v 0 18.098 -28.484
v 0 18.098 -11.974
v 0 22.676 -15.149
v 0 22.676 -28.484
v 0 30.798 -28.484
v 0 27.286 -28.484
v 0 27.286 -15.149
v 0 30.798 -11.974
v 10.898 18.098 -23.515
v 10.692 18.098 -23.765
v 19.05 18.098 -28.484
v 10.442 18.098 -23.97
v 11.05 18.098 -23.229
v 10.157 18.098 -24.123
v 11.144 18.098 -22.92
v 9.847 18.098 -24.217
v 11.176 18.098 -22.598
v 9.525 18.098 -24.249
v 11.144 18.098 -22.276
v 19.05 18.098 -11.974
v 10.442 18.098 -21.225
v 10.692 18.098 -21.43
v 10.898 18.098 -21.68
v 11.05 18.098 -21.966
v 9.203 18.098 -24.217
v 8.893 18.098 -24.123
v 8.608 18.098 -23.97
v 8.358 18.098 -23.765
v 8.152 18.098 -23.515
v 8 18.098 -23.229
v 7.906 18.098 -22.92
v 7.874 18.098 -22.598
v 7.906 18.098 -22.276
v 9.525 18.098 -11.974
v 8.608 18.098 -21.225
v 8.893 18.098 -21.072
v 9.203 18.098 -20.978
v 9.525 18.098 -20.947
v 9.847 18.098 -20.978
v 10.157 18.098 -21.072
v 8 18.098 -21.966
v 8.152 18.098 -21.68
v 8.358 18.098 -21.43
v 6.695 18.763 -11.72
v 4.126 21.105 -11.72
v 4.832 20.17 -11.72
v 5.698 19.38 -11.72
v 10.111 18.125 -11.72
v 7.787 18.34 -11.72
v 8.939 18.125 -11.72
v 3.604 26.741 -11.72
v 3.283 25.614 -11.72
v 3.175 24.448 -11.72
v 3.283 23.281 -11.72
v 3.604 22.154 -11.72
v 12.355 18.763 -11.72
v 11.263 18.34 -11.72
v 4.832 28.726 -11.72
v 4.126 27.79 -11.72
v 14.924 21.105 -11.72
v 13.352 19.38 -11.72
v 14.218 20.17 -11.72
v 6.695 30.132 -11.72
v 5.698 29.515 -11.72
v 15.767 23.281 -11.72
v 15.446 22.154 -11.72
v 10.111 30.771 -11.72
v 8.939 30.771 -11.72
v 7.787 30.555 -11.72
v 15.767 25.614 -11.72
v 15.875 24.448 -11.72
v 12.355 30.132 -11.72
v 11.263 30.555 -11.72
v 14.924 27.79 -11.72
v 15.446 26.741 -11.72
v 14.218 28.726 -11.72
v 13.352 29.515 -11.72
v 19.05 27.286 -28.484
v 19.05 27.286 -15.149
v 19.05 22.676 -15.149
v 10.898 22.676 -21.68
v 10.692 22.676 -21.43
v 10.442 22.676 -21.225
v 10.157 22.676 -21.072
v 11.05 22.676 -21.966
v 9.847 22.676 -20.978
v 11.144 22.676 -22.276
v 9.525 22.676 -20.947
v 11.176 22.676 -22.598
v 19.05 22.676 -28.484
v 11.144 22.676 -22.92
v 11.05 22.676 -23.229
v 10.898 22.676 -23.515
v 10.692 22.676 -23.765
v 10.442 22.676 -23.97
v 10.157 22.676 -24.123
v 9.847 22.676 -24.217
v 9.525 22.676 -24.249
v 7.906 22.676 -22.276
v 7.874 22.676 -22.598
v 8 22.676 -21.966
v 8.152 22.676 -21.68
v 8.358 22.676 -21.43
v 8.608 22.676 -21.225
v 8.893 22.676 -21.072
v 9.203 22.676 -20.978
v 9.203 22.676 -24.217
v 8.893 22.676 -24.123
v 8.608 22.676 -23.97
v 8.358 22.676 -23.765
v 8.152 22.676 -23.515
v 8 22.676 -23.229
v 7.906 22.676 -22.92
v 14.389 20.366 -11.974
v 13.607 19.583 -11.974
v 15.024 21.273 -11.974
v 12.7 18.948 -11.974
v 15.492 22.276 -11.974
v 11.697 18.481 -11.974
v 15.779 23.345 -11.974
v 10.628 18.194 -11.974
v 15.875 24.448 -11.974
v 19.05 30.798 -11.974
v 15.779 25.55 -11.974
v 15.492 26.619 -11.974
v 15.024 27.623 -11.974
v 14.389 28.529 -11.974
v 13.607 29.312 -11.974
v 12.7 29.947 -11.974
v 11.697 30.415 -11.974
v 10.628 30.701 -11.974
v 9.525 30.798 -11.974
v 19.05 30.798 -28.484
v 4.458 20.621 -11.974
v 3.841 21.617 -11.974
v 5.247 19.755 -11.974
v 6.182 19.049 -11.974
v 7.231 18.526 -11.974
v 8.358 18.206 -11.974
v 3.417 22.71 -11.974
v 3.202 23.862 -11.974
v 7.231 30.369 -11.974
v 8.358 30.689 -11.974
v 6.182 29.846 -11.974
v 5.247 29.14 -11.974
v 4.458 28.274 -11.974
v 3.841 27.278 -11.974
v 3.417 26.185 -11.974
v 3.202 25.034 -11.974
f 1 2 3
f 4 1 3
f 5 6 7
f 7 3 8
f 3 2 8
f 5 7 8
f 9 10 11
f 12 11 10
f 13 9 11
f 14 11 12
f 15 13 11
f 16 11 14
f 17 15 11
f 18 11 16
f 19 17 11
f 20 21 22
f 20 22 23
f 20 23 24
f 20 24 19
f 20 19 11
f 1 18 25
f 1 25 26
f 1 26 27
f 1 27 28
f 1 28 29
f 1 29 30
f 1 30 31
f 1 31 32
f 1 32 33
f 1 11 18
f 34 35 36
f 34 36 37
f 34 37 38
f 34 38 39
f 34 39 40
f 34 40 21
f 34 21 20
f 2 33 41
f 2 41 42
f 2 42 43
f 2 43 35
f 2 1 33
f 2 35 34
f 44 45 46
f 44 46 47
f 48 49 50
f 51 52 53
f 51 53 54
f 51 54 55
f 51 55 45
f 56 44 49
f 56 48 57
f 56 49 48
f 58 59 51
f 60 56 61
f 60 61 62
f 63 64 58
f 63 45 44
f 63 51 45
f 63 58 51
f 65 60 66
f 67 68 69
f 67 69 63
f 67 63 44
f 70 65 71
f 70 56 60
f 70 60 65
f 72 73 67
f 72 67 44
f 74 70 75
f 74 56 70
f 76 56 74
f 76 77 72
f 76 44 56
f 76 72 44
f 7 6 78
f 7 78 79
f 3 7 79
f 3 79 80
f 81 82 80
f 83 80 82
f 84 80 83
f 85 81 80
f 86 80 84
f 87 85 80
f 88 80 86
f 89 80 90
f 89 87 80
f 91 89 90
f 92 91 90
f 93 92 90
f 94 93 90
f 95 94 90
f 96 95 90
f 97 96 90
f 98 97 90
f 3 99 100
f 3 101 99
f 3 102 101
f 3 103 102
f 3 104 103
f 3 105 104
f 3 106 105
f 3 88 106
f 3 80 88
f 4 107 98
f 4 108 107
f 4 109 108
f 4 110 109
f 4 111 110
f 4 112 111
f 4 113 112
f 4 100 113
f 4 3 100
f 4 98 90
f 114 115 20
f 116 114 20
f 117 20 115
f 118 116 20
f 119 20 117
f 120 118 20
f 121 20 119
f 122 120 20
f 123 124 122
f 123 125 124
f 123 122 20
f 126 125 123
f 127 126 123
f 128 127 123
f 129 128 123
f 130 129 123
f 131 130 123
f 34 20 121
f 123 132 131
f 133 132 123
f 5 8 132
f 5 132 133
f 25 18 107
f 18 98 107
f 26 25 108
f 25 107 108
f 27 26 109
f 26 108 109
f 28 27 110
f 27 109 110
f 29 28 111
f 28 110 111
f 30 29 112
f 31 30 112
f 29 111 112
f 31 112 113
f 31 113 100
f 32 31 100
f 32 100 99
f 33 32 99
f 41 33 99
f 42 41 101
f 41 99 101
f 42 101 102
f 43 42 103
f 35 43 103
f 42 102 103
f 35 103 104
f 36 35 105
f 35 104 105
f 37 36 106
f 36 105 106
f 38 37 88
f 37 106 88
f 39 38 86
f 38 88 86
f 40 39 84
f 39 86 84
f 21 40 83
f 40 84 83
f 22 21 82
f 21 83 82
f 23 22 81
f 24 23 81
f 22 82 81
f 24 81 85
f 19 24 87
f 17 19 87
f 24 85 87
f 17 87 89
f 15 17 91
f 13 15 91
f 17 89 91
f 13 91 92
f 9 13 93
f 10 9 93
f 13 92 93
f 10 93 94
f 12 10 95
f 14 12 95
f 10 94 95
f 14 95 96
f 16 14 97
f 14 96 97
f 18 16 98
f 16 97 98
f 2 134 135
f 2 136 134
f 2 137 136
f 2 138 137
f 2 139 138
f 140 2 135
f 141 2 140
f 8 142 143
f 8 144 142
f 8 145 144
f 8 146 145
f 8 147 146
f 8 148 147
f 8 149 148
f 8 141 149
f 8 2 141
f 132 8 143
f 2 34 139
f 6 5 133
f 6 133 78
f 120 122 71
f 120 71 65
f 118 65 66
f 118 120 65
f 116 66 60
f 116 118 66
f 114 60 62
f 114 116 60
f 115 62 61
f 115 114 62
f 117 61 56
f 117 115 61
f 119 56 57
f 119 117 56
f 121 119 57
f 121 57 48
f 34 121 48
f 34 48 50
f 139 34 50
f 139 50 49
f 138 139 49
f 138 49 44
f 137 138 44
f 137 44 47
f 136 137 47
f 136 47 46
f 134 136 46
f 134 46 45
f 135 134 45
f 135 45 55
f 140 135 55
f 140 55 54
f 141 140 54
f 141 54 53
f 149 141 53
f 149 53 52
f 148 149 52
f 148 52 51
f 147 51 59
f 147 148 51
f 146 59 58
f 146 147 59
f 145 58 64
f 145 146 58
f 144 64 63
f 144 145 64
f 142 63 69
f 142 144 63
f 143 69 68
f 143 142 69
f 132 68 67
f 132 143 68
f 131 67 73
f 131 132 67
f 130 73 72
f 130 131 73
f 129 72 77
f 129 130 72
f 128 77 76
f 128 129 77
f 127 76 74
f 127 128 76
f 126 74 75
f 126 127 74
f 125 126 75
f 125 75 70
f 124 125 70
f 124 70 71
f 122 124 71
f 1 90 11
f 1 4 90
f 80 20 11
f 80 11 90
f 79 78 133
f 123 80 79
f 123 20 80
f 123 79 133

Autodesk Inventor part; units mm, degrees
ref_plane "YZ Plane" through (0, 0, 0) normal (1, 0, 0) x (0, 1, 0)
ref_plane "XZ Plane" through (0, 0, 0) normal (0, 1, 0) x (-1, 0, 0)
ref_plane "XY Plane" through (0, 0, 0) normal (0, 0, 1) x (1, 0, 0)
sketch "Sketch1" plane through (0, 0, 0) normal (1, 0, 0) x (0, 1, 0)
  line L0 (18.0976, -11.9743) -> (30.7976, -11.9743)
  line L1 (30.7976, -11.9743) -> (30.7976, -28.4843)
  line L2 (18.0976, -28.4843) -> (18.0976, -11.9743)
  line L3 (27.2855, -28.4843) -> (27.2855, -15.1493)
  line L4 (27.2855, -15.1493) -> (22.6756, -15.1493)
  line L5 (22.6756, -15.1493) -> (22.6756, -28.4843)
  line L6 (30.7976, -28.4843) -> (27.2855, -28.4843)
  line L7 (22.6756, -28.4843) -> (18.0976, -28.4843)
  point P0 (0, 0)
  dimension "d0" = 12.7
  dimension "d1" = 16.51
  dimension "d14" = 3.175
extrude "Extrusion1" add sketch "Sketch1" along normal blind 19.05
sketch "Sketch2" plane through (0, 18.0976, -28.4843) normal (0, -1, 0) x (1, 0, 0)
  circle A0 centre (9.525, 5.8867) radius 2.6491
  point P0 (0, 28.4843)
hole "Hole1" at (9.525, 18.0976, -22.5976) direction (0, 1, 0) diameter 3.302 depth 7.62 tip angle 118 thread size "8-32 UNC" class "2B" standard "ANSI Unified Screw Threads"
sketch "Sketch3" plane through (0, 18.0976, -11.9743) normal (0, 0, 1) x (1, 0, 0)
  circle A0 centre (9.525, 6.35) radius 6.35
  point P0 (0, -18.0976)
  dimension "d11" = 12.7
extrude "Extrusion2" add sketch "Sketch3" along normal blind 0.254
properties part number "endcapTarget"
